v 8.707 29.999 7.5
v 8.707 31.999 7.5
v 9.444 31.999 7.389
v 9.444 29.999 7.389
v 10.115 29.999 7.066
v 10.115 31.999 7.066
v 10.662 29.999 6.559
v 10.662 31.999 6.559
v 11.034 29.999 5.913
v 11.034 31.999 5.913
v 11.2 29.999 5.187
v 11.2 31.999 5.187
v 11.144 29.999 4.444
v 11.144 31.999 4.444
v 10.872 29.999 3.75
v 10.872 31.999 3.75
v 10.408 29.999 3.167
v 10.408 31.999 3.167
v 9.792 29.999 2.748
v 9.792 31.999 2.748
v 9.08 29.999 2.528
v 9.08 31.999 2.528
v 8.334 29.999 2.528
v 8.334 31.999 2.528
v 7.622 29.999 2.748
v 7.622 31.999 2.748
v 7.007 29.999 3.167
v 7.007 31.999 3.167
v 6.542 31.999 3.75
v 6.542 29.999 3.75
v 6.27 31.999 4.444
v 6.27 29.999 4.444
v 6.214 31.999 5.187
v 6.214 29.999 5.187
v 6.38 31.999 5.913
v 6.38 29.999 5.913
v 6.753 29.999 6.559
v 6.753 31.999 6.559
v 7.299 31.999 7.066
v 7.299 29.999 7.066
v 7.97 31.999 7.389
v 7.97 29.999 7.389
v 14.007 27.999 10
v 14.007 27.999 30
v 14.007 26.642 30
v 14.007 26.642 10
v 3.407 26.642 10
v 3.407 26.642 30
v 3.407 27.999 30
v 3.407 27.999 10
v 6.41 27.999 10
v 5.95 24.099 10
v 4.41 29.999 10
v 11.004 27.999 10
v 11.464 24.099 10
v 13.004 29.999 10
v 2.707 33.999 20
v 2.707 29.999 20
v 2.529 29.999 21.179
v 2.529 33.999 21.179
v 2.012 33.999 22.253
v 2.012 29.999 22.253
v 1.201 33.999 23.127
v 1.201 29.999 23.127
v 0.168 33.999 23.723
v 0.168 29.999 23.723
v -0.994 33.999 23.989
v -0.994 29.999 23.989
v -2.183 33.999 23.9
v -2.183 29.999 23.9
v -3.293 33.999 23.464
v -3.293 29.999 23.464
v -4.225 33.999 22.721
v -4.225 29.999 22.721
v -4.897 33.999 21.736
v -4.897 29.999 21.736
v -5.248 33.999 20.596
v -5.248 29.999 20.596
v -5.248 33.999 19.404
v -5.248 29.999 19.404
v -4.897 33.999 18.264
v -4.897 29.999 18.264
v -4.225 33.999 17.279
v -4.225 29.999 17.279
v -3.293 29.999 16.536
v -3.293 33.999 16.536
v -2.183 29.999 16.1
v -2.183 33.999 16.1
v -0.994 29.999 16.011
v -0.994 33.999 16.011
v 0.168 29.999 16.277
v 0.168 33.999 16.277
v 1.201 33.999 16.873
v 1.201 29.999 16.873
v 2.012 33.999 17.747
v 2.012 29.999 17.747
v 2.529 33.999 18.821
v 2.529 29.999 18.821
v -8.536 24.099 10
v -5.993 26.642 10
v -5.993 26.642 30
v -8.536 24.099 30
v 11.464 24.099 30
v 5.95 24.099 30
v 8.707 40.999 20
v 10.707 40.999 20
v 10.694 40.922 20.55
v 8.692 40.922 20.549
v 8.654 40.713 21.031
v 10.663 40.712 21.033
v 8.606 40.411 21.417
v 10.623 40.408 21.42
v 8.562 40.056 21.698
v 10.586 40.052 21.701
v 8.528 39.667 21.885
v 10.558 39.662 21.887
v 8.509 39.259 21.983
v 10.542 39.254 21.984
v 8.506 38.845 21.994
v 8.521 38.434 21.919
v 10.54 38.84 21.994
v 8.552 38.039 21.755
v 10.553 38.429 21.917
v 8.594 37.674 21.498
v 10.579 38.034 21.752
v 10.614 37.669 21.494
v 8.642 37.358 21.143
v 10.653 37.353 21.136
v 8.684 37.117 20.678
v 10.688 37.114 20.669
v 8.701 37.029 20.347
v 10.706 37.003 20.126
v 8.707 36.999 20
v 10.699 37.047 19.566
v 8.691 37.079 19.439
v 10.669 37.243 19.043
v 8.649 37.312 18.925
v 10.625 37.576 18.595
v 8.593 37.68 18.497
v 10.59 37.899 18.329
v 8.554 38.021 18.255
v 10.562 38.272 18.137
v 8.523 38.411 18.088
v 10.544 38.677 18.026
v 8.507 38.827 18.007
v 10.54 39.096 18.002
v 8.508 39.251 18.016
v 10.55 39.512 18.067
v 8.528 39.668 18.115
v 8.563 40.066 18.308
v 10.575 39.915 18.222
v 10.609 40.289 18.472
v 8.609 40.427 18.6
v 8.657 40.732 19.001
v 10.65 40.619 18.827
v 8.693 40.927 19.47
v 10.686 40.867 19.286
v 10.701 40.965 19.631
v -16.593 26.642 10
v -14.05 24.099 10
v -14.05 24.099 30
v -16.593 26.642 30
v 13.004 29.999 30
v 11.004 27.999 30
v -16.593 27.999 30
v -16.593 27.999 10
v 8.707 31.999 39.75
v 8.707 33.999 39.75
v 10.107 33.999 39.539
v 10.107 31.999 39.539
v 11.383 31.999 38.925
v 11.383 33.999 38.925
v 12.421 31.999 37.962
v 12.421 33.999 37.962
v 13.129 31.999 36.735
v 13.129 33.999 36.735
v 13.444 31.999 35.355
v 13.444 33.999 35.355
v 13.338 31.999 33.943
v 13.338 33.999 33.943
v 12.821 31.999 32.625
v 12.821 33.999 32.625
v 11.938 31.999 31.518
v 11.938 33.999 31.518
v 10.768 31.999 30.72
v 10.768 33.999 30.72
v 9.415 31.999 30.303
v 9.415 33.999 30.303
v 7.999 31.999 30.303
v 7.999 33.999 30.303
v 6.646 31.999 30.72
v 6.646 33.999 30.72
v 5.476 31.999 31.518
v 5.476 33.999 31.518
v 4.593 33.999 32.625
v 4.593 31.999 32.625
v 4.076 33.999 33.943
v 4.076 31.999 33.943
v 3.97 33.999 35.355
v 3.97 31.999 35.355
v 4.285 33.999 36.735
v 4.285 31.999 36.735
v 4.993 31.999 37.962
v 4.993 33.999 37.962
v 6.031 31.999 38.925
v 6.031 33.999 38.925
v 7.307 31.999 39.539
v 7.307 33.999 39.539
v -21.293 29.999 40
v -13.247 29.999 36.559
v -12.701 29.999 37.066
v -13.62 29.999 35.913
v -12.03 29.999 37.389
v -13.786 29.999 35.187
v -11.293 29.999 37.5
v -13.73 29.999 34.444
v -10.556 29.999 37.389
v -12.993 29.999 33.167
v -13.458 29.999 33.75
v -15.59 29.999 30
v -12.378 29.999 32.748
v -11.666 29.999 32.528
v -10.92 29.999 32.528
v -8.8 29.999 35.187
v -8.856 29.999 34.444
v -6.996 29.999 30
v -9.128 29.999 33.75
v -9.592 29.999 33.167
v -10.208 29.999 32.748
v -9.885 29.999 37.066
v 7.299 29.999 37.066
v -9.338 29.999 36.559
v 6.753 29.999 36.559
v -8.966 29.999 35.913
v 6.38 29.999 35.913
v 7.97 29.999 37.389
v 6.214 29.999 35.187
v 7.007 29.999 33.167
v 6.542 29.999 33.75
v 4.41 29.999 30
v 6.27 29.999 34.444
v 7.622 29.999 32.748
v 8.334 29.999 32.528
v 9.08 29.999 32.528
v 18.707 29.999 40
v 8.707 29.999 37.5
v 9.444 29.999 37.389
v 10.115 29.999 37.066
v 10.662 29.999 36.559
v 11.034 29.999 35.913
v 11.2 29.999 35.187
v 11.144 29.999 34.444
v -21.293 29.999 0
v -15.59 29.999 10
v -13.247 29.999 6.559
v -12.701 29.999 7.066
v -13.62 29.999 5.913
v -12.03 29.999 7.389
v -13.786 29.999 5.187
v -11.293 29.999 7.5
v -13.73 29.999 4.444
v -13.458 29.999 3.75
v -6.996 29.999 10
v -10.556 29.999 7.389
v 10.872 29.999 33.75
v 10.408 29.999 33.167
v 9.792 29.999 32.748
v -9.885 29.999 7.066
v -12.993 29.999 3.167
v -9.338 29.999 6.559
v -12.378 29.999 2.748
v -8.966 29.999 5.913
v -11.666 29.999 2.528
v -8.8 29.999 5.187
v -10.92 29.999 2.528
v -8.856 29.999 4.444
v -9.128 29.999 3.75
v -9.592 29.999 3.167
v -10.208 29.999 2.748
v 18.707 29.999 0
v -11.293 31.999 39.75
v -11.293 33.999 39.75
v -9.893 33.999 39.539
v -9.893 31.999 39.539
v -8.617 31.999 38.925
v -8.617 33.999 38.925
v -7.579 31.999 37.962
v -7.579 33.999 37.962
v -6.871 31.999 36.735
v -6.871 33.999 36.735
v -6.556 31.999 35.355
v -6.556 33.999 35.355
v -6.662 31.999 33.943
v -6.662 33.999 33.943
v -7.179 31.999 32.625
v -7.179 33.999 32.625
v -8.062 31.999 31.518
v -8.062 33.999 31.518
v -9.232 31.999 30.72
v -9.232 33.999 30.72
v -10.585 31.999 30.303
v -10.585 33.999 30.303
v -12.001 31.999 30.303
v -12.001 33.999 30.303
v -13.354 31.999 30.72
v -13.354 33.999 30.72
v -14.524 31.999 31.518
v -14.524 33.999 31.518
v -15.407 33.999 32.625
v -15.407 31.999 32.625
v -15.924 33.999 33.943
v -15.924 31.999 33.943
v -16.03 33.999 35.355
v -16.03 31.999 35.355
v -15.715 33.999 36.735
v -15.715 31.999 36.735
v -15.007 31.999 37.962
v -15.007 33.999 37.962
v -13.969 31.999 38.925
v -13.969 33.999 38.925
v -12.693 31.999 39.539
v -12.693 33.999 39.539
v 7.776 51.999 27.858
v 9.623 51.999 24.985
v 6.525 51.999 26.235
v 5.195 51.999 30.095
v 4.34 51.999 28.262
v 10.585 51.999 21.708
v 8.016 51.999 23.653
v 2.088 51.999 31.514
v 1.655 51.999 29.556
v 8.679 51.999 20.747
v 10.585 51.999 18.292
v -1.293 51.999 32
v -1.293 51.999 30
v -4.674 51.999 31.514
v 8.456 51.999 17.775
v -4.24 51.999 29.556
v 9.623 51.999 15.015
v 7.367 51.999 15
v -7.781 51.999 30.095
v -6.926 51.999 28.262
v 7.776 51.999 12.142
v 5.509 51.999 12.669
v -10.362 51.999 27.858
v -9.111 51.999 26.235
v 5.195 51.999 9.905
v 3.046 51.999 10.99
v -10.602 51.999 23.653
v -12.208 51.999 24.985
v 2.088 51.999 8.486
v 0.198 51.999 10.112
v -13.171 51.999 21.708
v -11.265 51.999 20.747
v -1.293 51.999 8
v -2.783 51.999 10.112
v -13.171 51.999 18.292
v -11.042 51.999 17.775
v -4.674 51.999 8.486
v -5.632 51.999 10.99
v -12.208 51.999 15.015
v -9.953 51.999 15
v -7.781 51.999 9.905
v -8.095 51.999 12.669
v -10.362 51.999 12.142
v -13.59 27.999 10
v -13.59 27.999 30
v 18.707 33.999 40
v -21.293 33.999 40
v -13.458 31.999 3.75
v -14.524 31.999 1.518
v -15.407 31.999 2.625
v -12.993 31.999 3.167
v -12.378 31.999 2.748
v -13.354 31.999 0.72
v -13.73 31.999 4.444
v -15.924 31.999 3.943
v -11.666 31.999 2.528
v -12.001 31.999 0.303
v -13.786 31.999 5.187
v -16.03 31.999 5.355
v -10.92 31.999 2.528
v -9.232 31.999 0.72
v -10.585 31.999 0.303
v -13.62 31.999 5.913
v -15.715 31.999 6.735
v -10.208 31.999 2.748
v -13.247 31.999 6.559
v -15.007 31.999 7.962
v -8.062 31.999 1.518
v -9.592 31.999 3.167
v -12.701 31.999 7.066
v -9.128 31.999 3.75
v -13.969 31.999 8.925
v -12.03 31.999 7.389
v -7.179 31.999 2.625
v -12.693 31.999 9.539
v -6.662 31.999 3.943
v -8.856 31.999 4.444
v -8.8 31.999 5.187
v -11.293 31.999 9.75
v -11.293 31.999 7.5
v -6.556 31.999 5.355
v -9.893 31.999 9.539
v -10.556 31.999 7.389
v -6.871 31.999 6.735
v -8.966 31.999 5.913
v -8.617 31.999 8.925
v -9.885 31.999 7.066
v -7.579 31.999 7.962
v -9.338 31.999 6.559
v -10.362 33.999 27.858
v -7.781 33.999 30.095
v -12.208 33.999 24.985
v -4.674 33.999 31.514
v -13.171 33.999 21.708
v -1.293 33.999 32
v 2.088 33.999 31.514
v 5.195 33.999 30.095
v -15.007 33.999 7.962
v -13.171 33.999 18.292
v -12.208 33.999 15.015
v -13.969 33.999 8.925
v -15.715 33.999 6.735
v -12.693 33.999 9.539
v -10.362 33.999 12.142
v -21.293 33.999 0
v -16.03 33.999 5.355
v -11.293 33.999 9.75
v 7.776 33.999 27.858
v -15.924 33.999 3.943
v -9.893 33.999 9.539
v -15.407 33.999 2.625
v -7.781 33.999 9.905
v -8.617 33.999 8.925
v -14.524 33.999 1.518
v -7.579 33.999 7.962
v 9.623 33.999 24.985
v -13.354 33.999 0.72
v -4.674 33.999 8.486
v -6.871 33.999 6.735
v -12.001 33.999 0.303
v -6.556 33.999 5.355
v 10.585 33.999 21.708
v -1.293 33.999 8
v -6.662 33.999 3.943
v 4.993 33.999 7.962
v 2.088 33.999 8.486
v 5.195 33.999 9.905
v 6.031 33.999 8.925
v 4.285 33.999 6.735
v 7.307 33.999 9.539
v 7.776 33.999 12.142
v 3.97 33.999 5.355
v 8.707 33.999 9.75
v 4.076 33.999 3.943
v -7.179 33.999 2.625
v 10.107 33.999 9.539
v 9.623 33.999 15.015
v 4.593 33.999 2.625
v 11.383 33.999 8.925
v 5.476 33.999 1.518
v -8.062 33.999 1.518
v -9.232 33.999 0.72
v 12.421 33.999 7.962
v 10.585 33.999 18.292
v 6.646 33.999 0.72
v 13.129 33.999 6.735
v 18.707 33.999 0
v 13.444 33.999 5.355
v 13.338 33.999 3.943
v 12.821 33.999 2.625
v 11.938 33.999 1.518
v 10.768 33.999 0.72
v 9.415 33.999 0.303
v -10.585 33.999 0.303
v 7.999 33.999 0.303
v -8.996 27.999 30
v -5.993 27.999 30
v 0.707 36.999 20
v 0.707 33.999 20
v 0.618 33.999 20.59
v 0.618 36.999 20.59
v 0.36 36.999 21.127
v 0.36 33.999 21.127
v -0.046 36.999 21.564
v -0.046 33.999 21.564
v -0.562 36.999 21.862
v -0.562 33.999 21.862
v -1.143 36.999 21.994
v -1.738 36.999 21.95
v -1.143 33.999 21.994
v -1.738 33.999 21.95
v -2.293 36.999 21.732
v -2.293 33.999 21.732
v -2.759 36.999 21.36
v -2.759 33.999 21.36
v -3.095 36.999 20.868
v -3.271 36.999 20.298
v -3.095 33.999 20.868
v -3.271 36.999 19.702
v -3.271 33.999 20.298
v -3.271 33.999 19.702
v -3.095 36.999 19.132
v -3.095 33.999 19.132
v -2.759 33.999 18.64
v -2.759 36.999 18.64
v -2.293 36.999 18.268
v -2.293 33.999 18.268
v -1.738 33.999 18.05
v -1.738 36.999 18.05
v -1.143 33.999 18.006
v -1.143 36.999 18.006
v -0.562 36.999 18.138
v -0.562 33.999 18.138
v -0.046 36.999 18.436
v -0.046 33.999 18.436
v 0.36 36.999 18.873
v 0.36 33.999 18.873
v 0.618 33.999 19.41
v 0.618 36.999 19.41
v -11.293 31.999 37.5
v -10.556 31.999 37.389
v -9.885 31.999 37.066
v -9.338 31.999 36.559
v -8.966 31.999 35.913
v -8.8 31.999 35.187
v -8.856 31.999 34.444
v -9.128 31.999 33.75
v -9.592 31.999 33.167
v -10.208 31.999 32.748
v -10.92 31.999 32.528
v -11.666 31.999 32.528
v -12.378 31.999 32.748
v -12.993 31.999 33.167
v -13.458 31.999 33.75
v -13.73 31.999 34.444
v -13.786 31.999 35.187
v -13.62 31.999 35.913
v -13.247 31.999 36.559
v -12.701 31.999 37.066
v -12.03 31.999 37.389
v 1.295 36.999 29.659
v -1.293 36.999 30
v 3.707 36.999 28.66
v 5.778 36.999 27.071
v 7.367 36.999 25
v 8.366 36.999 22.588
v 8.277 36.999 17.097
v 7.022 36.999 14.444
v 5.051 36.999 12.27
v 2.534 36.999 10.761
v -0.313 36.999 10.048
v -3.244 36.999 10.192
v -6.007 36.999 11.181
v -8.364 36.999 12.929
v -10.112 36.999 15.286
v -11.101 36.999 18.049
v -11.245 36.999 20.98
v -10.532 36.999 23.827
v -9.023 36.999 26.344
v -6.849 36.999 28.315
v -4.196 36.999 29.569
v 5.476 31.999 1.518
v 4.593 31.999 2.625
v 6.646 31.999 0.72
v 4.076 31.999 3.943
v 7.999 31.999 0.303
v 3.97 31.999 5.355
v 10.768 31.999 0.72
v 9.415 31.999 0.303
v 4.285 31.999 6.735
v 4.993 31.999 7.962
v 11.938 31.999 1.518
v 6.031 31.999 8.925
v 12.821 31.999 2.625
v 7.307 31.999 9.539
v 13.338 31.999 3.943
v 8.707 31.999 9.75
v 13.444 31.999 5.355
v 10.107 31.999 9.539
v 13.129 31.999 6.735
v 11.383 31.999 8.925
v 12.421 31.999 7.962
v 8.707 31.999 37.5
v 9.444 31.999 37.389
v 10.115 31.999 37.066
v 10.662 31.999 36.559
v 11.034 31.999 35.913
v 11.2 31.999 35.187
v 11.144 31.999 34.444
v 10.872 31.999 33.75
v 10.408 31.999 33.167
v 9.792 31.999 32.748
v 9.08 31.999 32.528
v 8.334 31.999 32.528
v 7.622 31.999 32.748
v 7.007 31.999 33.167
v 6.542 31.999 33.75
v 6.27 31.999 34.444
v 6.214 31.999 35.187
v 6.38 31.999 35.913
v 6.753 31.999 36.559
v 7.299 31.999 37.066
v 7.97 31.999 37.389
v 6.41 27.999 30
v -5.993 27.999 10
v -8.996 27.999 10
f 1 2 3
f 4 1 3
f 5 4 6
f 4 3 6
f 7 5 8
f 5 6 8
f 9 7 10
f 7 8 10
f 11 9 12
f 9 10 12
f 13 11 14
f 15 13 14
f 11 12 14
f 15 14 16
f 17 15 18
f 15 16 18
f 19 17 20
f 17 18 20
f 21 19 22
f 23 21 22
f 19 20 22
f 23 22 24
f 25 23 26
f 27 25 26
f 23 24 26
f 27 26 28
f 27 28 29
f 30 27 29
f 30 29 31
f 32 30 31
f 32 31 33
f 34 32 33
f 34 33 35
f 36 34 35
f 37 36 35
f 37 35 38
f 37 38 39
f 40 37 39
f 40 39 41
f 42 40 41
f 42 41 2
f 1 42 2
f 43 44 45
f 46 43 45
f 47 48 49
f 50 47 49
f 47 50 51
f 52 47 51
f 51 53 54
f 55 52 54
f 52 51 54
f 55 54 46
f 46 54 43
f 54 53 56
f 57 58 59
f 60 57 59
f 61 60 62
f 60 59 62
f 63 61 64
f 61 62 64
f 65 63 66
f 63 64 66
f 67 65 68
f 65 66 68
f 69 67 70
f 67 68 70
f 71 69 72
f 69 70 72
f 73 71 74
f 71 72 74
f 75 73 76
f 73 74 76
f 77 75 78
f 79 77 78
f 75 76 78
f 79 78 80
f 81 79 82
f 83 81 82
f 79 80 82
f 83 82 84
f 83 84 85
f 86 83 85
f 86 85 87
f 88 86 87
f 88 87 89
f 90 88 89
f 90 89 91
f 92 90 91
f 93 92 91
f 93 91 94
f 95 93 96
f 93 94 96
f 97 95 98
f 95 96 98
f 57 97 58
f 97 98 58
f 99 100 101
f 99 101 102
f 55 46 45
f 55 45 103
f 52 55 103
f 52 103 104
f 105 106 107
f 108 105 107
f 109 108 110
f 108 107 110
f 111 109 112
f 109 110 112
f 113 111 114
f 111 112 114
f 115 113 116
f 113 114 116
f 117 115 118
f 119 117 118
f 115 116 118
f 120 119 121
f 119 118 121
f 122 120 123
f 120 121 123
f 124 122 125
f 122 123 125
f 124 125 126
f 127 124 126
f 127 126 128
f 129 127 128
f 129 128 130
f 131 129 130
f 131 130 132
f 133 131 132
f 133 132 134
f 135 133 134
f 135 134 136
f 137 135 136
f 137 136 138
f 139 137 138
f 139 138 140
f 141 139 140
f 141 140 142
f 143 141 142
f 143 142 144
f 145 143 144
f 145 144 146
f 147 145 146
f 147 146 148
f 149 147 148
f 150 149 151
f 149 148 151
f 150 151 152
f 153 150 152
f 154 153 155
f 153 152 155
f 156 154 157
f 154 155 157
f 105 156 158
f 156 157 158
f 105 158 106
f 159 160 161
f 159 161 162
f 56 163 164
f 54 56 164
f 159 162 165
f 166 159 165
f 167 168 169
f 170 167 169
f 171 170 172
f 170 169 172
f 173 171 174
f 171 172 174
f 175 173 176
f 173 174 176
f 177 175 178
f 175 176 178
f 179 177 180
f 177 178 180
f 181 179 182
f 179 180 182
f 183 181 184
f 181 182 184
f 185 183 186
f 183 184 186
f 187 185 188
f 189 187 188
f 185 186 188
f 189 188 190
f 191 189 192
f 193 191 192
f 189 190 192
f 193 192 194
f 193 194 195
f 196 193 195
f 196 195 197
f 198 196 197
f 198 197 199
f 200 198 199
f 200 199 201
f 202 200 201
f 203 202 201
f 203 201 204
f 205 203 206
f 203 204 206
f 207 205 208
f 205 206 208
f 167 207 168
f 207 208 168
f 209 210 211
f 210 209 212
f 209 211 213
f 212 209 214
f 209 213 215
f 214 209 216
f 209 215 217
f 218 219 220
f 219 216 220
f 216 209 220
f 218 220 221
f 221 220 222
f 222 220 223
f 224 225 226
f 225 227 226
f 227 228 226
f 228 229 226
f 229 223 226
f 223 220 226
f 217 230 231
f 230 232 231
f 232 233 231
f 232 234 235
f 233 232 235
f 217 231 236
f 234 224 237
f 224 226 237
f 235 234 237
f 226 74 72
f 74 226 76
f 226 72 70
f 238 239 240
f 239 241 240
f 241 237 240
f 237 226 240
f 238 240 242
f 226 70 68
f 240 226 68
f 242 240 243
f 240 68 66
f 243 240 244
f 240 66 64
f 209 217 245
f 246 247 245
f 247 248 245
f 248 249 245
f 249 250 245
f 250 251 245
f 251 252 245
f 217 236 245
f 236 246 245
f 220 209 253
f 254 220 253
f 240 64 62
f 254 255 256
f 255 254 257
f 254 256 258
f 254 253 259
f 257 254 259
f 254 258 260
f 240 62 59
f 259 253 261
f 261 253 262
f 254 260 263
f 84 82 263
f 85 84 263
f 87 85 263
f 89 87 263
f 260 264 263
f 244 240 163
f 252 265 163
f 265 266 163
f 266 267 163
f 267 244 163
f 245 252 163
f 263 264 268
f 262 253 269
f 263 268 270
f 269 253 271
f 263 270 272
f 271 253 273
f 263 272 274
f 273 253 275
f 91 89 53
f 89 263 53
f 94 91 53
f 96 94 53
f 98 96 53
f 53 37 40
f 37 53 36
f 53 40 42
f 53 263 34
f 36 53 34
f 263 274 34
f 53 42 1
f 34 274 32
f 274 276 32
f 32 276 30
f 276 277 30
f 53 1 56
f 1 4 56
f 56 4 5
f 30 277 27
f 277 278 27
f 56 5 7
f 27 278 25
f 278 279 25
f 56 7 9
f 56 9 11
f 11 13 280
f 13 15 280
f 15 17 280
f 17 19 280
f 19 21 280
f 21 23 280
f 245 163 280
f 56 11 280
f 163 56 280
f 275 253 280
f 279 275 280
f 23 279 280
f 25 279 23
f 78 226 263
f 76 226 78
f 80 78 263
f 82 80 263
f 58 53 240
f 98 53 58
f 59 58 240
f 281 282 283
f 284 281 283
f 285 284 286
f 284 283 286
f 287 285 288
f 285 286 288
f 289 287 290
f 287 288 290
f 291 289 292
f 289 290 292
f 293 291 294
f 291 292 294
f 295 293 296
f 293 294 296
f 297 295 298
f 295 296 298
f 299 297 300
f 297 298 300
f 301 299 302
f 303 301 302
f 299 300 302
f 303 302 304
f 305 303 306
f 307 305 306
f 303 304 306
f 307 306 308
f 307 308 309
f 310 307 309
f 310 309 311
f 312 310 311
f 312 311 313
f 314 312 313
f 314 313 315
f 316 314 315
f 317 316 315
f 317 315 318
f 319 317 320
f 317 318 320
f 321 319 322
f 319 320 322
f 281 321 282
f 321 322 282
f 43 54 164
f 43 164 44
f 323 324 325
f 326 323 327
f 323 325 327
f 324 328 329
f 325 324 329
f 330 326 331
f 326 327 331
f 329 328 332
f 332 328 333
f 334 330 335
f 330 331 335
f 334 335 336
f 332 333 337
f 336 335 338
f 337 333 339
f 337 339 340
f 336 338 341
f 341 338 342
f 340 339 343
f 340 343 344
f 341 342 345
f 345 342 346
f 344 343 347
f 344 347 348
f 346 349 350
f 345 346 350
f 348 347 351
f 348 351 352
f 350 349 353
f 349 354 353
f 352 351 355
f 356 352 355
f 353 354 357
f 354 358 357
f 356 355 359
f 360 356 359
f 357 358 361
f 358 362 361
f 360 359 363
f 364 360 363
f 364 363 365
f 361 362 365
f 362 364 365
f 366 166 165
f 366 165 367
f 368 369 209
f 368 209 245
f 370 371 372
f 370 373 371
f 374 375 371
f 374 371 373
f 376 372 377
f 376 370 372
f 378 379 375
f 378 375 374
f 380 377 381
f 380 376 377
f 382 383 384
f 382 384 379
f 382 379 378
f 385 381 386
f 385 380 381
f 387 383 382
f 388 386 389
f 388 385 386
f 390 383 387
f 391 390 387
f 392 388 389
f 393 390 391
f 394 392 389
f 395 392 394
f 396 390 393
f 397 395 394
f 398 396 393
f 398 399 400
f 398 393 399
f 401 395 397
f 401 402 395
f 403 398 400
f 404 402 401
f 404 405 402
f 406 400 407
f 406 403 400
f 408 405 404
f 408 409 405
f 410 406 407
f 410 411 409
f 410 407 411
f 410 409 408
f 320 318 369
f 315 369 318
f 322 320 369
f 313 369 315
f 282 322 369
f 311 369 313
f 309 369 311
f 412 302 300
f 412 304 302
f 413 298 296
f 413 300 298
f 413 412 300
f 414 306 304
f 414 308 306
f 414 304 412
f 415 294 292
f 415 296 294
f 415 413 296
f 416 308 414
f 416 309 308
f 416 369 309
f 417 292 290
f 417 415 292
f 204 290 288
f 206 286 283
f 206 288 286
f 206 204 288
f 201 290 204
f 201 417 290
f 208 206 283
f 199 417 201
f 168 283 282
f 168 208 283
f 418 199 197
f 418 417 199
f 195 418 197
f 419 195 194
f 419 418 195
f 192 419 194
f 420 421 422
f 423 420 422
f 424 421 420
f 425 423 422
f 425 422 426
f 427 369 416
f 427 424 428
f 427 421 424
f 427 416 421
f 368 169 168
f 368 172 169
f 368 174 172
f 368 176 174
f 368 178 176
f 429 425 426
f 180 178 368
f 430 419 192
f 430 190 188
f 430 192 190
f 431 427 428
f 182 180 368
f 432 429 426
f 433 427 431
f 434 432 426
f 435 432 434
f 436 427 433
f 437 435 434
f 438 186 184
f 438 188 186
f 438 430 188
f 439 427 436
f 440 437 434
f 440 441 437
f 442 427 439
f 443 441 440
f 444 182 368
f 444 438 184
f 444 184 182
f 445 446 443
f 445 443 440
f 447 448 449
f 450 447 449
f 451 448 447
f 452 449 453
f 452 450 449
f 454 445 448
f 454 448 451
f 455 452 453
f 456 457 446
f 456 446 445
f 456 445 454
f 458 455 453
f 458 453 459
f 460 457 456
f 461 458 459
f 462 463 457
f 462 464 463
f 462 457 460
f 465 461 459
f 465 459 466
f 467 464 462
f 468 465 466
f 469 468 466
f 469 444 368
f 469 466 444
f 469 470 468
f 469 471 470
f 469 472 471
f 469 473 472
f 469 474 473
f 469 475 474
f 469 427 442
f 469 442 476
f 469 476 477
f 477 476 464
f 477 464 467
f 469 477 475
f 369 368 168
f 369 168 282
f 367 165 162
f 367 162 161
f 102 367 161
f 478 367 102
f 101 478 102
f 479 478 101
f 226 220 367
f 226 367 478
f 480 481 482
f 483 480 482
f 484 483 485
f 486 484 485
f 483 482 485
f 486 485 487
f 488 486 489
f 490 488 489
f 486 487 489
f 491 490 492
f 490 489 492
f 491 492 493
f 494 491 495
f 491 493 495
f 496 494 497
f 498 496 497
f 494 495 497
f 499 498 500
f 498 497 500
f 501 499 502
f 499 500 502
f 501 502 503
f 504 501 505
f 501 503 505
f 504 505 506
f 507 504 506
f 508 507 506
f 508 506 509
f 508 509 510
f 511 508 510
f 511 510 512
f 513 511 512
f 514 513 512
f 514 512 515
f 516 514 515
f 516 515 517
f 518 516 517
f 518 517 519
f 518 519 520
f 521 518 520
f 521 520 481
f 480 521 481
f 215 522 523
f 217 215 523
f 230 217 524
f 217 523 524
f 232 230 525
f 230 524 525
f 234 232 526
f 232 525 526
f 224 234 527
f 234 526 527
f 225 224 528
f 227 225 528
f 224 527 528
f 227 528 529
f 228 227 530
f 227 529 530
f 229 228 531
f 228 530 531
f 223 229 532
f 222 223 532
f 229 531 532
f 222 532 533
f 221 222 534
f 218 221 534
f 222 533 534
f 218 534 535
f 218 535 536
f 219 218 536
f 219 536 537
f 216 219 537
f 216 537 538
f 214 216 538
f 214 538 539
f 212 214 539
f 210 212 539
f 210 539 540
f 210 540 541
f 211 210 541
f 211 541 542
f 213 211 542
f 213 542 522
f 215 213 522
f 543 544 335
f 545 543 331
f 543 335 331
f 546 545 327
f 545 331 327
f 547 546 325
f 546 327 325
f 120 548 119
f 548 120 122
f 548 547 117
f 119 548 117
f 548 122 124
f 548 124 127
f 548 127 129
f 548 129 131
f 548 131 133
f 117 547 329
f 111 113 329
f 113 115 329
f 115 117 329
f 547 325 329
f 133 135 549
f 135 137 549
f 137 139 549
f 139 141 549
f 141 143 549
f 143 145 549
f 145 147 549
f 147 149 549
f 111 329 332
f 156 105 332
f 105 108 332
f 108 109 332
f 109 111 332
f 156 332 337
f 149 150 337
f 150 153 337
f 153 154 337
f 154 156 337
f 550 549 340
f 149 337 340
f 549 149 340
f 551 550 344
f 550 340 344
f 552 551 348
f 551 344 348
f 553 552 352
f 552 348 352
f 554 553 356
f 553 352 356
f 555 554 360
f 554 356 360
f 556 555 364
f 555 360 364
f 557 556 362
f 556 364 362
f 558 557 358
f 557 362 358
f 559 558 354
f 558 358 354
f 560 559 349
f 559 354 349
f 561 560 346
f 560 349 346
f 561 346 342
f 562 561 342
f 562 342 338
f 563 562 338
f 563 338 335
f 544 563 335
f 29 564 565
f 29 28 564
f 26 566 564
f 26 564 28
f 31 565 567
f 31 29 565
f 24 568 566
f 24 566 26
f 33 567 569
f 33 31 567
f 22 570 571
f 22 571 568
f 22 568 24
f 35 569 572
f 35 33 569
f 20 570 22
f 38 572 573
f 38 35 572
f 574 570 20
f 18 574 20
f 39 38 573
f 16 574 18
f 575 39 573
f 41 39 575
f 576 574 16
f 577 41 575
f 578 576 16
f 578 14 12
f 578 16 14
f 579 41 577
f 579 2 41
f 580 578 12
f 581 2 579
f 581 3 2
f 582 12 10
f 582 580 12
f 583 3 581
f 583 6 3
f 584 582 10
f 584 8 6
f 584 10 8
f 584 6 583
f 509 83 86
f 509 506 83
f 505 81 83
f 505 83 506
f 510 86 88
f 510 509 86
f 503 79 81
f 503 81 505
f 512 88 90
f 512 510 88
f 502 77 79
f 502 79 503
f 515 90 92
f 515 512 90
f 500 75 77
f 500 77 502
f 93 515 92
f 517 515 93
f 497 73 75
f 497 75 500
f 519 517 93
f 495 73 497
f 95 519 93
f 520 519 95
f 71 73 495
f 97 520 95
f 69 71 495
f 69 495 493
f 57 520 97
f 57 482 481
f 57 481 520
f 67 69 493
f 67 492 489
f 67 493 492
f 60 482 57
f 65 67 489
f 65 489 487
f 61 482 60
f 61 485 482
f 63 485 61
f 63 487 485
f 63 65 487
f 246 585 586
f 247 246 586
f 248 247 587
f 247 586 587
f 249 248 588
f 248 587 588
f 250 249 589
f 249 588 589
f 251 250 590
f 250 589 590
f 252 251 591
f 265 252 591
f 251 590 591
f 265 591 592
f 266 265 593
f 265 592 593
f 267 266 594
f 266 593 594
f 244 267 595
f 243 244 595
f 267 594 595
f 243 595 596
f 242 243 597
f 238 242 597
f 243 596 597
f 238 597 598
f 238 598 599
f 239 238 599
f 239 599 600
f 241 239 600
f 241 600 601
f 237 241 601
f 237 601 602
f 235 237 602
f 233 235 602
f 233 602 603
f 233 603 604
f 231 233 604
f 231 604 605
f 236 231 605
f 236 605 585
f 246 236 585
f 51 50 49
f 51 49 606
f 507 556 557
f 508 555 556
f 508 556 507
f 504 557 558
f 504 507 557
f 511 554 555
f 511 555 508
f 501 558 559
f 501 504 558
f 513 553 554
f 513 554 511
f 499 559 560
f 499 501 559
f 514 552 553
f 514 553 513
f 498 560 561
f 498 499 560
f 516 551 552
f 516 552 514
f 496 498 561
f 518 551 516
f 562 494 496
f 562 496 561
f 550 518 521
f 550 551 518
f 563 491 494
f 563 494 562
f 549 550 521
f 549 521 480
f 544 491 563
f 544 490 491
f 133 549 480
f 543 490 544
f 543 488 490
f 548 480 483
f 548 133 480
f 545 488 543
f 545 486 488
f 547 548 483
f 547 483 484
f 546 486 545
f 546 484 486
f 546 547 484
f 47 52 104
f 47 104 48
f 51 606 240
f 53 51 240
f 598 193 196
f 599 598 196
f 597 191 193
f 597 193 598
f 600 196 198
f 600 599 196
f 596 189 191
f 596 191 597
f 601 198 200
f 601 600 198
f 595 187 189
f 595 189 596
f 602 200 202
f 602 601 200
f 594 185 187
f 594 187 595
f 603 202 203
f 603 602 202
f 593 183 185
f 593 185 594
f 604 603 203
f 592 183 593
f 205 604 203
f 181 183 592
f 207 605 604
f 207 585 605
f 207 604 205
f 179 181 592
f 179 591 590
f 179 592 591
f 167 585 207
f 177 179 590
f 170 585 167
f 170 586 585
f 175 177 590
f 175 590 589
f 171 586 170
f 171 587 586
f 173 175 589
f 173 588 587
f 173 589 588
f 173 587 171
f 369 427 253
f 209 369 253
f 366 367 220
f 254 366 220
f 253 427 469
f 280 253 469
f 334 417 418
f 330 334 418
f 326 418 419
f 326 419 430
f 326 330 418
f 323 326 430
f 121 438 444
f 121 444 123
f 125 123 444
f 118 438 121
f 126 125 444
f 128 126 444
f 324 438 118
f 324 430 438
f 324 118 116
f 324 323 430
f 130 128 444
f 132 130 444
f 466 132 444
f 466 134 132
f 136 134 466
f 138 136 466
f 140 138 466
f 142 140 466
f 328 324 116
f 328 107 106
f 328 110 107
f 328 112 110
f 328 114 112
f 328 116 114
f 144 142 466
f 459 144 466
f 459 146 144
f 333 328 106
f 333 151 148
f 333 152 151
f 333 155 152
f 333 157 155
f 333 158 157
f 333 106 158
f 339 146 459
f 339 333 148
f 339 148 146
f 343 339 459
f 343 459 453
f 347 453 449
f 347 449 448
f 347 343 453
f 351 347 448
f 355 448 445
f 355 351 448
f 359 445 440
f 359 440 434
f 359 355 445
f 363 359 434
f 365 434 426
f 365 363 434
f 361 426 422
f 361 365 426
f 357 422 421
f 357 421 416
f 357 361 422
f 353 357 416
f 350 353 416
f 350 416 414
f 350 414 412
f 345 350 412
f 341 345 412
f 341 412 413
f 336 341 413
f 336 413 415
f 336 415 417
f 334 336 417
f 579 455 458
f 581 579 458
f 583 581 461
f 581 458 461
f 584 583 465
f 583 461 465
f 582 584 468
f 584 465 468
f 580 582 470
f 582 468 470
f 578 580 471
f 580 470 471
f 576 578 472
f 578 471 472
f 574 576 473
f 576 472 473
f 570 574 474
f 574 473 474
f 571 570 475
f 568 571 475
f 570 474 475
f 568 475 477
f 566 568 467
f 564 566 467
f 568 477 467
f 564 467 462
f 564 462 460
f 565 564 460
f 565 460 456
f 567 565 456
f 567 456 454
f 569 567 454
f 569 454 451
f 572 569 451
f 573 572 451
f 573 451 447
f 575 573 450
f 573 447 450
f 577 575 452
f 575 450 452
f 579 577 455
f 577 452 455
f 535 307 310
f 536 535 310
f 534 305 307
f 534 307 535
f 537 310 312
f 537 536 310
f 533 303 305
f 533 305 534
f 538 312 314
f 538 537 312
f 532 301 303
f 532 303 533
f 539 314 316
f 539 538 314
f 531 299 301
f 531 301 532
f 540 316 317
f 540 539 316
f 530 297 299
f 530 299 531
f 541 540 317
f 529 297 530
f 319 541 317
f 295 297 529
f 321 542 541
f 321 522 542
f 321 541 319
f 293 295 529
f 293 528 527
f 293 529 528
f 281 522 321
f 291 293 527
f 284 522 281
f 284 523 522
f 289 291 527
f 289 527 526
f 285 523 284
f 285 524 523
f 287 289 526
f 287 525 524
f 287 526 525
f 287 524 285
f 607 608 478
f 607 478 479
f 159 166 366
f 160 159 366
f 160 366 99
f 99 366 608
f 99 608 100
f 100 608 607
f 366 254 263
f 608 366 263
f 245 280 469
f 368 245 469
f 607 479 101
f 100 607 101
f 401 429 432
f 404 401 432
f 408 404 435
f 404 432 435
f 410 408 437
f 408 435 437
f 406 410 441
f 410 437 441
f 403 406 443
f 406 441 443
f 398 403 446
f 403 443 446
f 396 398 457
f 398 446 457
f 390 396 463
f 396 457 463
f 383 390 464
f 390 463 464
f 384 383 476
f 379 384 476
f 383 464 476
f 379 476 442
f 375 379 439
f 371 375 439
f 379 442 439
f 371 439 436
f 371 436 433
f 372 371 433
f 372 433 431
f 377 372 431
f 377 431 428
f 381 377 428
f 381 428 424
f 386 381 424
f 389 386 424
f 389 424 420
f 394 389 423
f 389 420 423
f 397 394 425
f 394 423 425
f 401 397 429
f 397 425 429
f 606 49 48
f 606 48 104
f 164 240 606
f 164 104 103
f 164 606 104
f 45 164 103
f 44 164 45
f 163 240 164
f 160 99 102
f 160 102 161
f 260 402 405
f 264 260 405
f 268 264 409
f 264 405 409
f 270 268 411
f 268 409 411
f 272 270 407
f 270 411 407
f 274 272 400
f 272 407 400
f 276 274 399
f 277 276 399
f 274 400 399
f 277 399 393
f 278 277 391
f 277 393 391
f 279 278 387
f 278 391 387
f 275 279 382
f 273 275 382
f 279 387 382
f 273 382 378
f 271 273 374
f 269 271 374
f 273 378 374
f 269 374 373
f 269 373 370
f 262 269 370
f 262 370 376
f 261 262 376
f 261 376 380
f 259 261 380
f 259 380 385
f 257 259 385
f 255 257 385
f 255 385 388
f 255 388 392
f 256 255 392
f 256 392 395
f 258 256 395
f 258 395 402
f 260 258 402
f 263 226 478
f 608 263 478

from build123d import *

# Parameters (mm, degrees)
BOSS_EXTRUDE1_DEPTH     = 40
MOVE_FACE1_DEPTH        = 40
SKETCH2_OUTSIDE_W       = 54.614
SKETCH2_OUTSIDE_H       = 54.614
SKETCH2_OUTSIDE_W_2     = 40
SKETCH2_OUTSIDE_H_2     = 20
CUT_EXTRUDE1_DEPTH      = 51.372492072
SKETCH3_R               = 10
CUT_EXTRUDE2_DEPTH      = 15
CUT_EXTRUDE3_REACH      = 78.837
CUT_EXTRUDE3_END_RADIUS = 10
SKETCH4_R               = 2
SKETCH5_R               = 2
CUT_EXTRUDE4_DEPTH      = 51.372492116
SKETCH6_R               = 4
CUT_EXTRUDE5_DEPTH      = 4
SKETCH7_OUTSIDE_W       = 54.614
SKETCH7_OUTSIDE_H       = 54.614
SKETCH7_OUTSIDE_R       = 12
CUT_EXTRUDE6_DEPTH      = 18
SKETCH8_R               = 2.5
CUT_EXTRUDE9_DEPTH      = 49.758465533
SKETCH9_R               = 4.75
CUT_EXTRUDE10_DEPTH     = 2


# Read off the part's stored shape, not the designer's step: Move Face1
with BuildPart() as part:
    # Sketch1 → Boss-Extrude1 (new body)
    with BuildSketch(Plane.XY):
        Polygon((-15.872908622, 29.998965851), (-14.072908622, 28.198965851), (-16.792908622, 28.198965851), (-16.792908622, 26.558965851), (-14.132908622, 23.898965851), (-8.452908622, 23.898965851), (-5.792908622, 26.558965851), (-5.792908622, 28.198965851), (-8.512908622, 28.198965851), (-6.712908622, 29.998965851), (4.127091378, 29.998965851), (5.927091378, 28.198965851), (3.207091378, 28.198965851), (3.207091378, 26.558965851), (5.867091378, 23.898965851), (11.547091378, 23.898965851), (14.207091378, 26.558965851), (14.207091378, 28.198965851), (11.487091378, 28.198965851), (13.287091378, 29.998965851), (18.707091378, 29.998965851), (18.707091378, 51.998965851), (-21.292908622, 51.998965851), (-21.292908622, 29.998965851), align=None)
    extrude(amount=BOSS_EXTRUDE1_DEPTH)

    # Move Face1 outline → Move Face1 (cut)
    with BuildSketch(Plane.XY):
        Polygon((-16.592908622, 27.998965851), (-13.590065909, 27.998965851), (-15.590065909, 29.998965851), (-15.872908622, 29.998965851), (-14.072908622, 28.198965851), (-16.792908622, 28.198965851), (-16.792908622, 26.558965851), (-14.132908622, 23.898965851), (-8.452908622, 23.898965851), (-5.792908622, 26.558965851), (-5.792908622, 28.198965851), (-8.512908622, 28.198965851), (-6.712908622, 29.998965851), (-6.995751334, 29.998965851), (-8.995751334, 27.998965851), (-5.992908622, 27.998965851), (-5.992908622, 26.641808564), (-8.535751334, 24.098965851), (-14.050065909, 24.098965851), (-16.592908622, 26.641808564), align=None)
        Polygon((4.409934091, 29.998965851), (4.127091378, 29.998965851), (5.927091378, 28.198965851), (3.207091378, 28.198965851), (3.207091378, 26.558965851), (5.867091378, 23.898965851), (11.547091378, 23.898965851), (14.207091378, 26.558965851), (14.207091378, 28.198965851), (11.487091378, 28.198965851), (13.287091378, 29.998965851), (13.004248666, 29.998965851), (11.004248666, 27.998965851), (14.007091378, 27.998965851), (14.007091378, 26.641808564), (11.464248666, 24.098965851), (5.949934091, 24.098965851), (3.407091378, 26.641808564), (3.407091378, 27.998965851), (6.409934091, 27.998965851), align=None)
    extrude(amount=MOVE_FACE1_DEPTH, mode=Mode.SUBTRACT)

    # Sketch2 outside → Cut-Extrude1 (cut, through all)
    with BuildSketch(Plane.XZ.offset(-29.998965851)):
        with Locations((-1.293, 20)):
            Rectangle(SKETCH2_OUTSIDE_W, SKETCH2_OUTSIDE_H)
        with Locations((-1.292908622, 20)):
            Rectangle(SKETCH2_OUTSIDE_W_2, SKETCH2_OUTSIDE_H_2, mode=Mode.SUBTRACT)
    extrude(amount=CUT_EXTRUDE1_DEPTH, mode=Mode.SUBTRACT)

    # Sketch3 → Cut-Extrude2 (cut)
    with BuildSketch(Plane(origin=(0, 51.998965851, 0), x_dir=(1, 0, 0), z_dir=(0, 1, 0))):
        with Locations(Location((-1.292908622, -20, 0), (0, 0, 270))):
            Circle(SKETCH3_R)
    extrude(amount=-CUT_EXTRUDE2_DEPTH, mode=Mode.SUBTRACT)

    # Cut-Extrude3: up to this cylinder (the profile starts outside it)
    cut_extrude3_end = Plane(origin=(-1.292908622, 38.998966, 20), z_dir=(0, 1, 0)) * Cylinder(CUT_EXTRUDE3_END_RADIUS, 178.674, mode=Mode.PRIVATE)
    # Sketch4 → Cut-Extrude3 (cut, up to the surface)
    with BuildSketch(Plane(origin=(18.707091378, 0, 0), x_dir=(0, 0, -1), z_dir=(1, 0, 0)), mode=Mode.PRIVATE) as cut_extrude3_sk1:
        with Locations(Location((-20, 38.998965851, 0), (0, 0, 90))):
            Circle(SKETCH4_R)
    cut_extrude3_tool1 = extrude(cut_extrude3_sk1.sketch, amount=-CUT_EXTRUDE3_REACH, mode=Mode.PRIVATE) - cut_extrude3_end
    add(cut_extrude3_tool1.solids().sort_by_distance((18.707091, 38.998966, 20))[0], mode=Mode.SUBTRACT)

    # Sketch5 → Cut-Extrude4 (cut, through all)
    with BuildSketch(Plane.XZ.offset(-29.998965851)):
        with Locations((-1.292908622, 20)):
            Circle(SKETCH5_R)
    extrude(amount=-CUT_EXTRUDE4_DEPTH, mode=Mode.SUBTRACT)

    # Sketch6 → Cut-Extrude5 (cut)
    with BuildSketch(Plane.XZ.offset(-29.998965851)):
        with Locations((-1.292908622, 20)):
            Circle(SKETCH6_R)
    extrude(amount=-CUT_EXTRUDE5_DEPTH, mode=Mode.SUBTRACT)

    # Sketch7 outside → Cut-Extrude6 (cut)
    with BuildSketch(Plane(origin=(0, 51.998965851, 0), x_dir=(1, 0, 0), z_dir=(0, 1, 0))):
        with Locations((-1.293, -20)):
            Rectangle(SKETCH7_OUTSIDE_W, SKETCH7_OUTSIDE_H)
        with Locations(Location((-1.292908622, -20, 0), (0, 0, 270))):
            Circle(SKETCH7_OUTSIDE_R, mode=Mode.SUBTRACT)
    extrude(amount=-CUT_EXTRUDE6_DEPTH, mode=Mode.SUBTRACT)

    # Sketch8 → Cut-Extrude9 (cut, through all)
    with BuildSketch(Plane(origin=(0, 33.998965851, 0), x_dir=(1, 0, 0), z_dir=(0, 1, 0))):
        with Locations(Location((8.707091378, -5, 0), (0, 0, 270))):
            Circle(SKETCH8_R)
        with Locations(Location((-11.292908622, -5, 0), (0, 0, 270))):
            Circle(SKETCH8_R)
        with Locations(Location((-11.292908622, -35, 0), (0, 0, 270))):
            Circle(SKETCH8_R)
        with Locations(Location((8.707091378, -35, 0), (0, 0, 270))):
            Circle(SKETCH8_R)
    extrude(amount=-CUT_EXTRUDE9_DEPTH, mode=Mode.SUBTRACT)

    # Sketch9 → Cut-Extrude10 (cut)
    with BuildSketch(Plane(origin=(0, 33.998965851, 0), x_dir=(1, 0, 0), z_dir=(0, 1, 0))):
        with Locations(Location((8.707091378, -5, 0), (0, 0, 270))):
            Circle(SKETCH9_R)
        with Locations(Location((8.707091378, -35, 0), (0, 0, 270))):
            Circle(SKETCH9_R)
        with Locations(Location((-11.292908622, -35, 0), (0, 0, 270))):
            Circle(SKETCH9_R)
        with Locations(Location((-11.292908622, -5, 0), (0, 0, 270))):
            Circle(SKETCH9_R)
    extrude(amount=-CUT_EXTRUDE10_DEPTH, mode=Mode.SUBTRACT)


solid = part.part
